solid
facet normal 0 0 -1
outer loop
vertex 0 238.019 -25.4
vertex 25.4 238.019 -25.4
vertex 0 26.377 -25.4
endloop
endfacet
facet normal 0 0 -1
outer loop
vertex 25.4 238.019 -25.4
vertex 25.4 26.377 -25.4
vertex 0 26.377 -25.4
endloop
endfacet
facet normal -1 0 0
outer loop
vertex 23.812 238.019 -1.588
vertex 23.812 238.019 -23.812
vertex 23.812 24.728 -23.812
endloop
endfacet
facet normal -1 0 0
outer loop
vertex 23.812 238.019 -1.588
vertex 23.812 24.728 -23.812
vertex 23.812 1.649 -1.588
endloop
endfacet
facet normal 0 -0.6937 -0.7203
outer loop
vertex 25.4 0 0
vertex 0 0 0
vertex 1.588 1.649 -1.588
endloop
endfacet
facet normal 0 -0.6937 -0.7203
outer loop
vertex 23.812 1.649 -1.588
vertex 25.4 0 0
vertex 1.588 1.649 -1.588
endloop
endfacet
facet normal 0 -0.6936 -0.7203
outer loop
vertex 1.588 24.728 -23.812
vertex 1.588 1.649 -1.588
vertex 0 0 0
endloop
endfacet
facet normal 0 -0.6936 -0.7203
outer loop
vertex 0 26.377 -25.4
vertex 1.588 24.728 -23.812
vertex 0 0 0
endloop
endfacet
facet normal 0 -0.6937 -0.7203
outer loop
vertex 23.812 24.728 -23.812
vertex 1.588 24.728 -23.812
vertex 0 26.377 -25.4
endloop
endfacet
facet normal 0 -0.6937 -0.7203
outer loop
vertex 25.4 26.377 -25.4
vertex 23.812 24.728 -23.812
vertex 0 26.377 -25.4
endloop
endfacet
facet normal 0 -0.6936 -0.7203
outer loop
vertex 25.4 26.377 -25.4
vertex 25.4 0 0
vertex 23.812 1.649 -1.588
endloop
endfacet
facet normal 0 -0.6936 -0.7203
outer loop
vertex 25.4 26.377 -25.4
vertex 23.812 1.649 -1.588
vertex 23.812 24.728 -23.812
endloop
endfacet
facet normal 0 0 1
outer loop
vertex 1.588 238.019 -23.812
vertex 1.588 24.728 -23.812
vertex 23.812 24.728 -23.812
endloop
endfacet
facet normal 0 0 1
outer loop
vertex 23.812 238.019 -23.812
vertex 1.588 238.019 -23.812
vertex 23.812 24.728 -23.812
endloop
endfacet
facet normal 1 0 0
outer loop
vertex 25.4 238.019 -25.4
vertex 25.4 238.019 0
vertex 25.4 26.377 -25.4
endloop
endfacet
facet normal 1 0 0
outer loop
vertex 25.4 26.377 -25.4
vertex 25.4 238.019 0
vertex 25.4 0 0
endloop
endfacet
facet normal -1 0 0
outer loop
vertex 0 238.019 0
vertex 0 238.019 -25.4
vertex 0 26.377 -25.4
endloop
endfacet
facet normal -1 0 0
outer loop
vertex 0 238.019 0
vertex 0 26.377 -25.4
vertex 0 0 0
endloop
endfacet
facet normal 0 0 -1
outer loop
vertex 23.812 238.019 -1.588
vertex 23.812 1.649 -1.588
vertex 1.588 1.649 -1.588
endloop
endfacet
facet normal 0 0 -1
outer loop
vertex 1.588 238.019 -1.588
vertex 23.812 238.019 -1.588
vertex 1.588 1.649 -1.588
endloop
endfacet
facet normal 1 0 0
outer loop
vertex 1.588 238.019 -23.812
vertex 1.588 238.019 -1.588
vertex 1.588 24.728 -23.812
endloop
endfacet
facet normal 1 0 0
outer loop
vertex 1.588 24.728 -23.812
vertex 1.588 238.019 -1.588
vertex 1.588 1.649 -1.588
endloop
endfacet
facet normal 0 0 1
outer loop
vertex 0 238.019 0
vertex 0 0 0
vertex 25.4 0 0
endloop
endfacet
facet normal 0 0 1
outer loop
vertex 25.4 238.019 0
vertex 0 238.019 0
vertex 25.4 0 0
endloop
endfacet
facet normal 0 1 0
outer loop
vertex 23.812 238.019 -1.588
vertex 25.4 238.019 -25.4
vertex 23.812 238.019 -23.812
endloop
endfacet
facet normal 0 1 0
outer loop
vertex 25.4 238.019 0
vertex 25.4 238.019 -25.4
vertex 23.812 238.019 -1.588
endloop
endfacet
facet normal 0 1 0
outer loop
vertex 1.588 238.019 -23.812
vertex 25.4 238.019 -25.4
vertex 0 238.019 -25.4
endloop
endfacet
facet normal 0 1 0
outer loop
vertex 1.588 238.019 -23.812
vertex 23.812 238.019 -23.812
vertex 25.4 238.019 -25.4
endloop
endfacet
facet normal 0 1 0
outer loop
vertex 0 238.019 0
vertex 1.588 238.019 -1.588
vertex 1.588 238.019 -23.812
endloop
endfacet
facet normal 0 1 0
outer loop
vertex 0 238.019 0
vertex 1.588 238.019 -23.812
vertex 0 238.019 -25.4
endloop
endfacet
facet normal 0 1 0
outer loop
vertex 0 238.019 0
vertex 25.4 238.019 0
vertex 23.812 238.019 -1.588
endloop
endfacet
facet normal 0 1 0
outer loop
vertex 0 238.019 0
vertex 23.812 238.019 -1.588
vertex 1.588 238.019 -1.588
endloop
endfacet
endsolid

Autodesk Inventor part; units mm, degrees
ref_plane "YZ Plane" through (0, 0, 0) normal (1, 0, 0) x (0, 1, 0)
ref_plane "XZ Plane" through (0, 0, 0) normal (0, 1, 0) x (-1, 0, 0)
ref_plane "XY Plane" through (0, 0, 0) normal (0, 0, 1) x (1, 0, 0)
sketch "Sketch1" plane through (0, 0, 0) normal (0, 1, 0) x (-1, 0, 0)
  line L0 (0, 0) -> (-25.4, 0)
  line L1 (-25.4, 0) -> (-25.4, -25.4)
  line L2 (-25.4, -25.4) -> (0, -25.4)
  line L3 (0, -25.4) -> (0, 0)
  line L4 (-23.8125, -23.8125) -> (-23.8125, -1.5875)
  line L5 (-23.8125, -1.5875) -> (-1.5875, -1.5875)
  line L6 (-1.5875, -1.5875) -> (-1.5875, -23.8125)
  line L7 (-1.5875, -23.8125) -> (-23.8125, -23.8125)
  dimension "d0" = 25.4
  dimension "d1" = 25.4
  dimension "d2" = 1.5875
extrude "Extrusion1" add sketch "Sketch1" along normal blind 238.0191
sketch "Sketch2" plane through (25.4, 0, 0) normal (1, 0, 0) x (0, 0, -1)
  line L0 (0, 0) -> (0, 238.0191) projected
  line L1 (0, 0) -> (25.4, 26.3769)
  line L2 (25.4, 0) -> (25.4, 238.0191) projected
  line L3 (0, 0) -> (25.4, 0) projected
  line L4 (25.4, 26.3769) -> (25.4, 0)
  line L5 (25.4, 0) -> (0, 0)
  dimension "d5" = 43.919
extrude "Extrusion2" cut sketch "Sketch2" against normal blind 25.4
properties part number "frontrollcage" material "Aluminum 6061"
